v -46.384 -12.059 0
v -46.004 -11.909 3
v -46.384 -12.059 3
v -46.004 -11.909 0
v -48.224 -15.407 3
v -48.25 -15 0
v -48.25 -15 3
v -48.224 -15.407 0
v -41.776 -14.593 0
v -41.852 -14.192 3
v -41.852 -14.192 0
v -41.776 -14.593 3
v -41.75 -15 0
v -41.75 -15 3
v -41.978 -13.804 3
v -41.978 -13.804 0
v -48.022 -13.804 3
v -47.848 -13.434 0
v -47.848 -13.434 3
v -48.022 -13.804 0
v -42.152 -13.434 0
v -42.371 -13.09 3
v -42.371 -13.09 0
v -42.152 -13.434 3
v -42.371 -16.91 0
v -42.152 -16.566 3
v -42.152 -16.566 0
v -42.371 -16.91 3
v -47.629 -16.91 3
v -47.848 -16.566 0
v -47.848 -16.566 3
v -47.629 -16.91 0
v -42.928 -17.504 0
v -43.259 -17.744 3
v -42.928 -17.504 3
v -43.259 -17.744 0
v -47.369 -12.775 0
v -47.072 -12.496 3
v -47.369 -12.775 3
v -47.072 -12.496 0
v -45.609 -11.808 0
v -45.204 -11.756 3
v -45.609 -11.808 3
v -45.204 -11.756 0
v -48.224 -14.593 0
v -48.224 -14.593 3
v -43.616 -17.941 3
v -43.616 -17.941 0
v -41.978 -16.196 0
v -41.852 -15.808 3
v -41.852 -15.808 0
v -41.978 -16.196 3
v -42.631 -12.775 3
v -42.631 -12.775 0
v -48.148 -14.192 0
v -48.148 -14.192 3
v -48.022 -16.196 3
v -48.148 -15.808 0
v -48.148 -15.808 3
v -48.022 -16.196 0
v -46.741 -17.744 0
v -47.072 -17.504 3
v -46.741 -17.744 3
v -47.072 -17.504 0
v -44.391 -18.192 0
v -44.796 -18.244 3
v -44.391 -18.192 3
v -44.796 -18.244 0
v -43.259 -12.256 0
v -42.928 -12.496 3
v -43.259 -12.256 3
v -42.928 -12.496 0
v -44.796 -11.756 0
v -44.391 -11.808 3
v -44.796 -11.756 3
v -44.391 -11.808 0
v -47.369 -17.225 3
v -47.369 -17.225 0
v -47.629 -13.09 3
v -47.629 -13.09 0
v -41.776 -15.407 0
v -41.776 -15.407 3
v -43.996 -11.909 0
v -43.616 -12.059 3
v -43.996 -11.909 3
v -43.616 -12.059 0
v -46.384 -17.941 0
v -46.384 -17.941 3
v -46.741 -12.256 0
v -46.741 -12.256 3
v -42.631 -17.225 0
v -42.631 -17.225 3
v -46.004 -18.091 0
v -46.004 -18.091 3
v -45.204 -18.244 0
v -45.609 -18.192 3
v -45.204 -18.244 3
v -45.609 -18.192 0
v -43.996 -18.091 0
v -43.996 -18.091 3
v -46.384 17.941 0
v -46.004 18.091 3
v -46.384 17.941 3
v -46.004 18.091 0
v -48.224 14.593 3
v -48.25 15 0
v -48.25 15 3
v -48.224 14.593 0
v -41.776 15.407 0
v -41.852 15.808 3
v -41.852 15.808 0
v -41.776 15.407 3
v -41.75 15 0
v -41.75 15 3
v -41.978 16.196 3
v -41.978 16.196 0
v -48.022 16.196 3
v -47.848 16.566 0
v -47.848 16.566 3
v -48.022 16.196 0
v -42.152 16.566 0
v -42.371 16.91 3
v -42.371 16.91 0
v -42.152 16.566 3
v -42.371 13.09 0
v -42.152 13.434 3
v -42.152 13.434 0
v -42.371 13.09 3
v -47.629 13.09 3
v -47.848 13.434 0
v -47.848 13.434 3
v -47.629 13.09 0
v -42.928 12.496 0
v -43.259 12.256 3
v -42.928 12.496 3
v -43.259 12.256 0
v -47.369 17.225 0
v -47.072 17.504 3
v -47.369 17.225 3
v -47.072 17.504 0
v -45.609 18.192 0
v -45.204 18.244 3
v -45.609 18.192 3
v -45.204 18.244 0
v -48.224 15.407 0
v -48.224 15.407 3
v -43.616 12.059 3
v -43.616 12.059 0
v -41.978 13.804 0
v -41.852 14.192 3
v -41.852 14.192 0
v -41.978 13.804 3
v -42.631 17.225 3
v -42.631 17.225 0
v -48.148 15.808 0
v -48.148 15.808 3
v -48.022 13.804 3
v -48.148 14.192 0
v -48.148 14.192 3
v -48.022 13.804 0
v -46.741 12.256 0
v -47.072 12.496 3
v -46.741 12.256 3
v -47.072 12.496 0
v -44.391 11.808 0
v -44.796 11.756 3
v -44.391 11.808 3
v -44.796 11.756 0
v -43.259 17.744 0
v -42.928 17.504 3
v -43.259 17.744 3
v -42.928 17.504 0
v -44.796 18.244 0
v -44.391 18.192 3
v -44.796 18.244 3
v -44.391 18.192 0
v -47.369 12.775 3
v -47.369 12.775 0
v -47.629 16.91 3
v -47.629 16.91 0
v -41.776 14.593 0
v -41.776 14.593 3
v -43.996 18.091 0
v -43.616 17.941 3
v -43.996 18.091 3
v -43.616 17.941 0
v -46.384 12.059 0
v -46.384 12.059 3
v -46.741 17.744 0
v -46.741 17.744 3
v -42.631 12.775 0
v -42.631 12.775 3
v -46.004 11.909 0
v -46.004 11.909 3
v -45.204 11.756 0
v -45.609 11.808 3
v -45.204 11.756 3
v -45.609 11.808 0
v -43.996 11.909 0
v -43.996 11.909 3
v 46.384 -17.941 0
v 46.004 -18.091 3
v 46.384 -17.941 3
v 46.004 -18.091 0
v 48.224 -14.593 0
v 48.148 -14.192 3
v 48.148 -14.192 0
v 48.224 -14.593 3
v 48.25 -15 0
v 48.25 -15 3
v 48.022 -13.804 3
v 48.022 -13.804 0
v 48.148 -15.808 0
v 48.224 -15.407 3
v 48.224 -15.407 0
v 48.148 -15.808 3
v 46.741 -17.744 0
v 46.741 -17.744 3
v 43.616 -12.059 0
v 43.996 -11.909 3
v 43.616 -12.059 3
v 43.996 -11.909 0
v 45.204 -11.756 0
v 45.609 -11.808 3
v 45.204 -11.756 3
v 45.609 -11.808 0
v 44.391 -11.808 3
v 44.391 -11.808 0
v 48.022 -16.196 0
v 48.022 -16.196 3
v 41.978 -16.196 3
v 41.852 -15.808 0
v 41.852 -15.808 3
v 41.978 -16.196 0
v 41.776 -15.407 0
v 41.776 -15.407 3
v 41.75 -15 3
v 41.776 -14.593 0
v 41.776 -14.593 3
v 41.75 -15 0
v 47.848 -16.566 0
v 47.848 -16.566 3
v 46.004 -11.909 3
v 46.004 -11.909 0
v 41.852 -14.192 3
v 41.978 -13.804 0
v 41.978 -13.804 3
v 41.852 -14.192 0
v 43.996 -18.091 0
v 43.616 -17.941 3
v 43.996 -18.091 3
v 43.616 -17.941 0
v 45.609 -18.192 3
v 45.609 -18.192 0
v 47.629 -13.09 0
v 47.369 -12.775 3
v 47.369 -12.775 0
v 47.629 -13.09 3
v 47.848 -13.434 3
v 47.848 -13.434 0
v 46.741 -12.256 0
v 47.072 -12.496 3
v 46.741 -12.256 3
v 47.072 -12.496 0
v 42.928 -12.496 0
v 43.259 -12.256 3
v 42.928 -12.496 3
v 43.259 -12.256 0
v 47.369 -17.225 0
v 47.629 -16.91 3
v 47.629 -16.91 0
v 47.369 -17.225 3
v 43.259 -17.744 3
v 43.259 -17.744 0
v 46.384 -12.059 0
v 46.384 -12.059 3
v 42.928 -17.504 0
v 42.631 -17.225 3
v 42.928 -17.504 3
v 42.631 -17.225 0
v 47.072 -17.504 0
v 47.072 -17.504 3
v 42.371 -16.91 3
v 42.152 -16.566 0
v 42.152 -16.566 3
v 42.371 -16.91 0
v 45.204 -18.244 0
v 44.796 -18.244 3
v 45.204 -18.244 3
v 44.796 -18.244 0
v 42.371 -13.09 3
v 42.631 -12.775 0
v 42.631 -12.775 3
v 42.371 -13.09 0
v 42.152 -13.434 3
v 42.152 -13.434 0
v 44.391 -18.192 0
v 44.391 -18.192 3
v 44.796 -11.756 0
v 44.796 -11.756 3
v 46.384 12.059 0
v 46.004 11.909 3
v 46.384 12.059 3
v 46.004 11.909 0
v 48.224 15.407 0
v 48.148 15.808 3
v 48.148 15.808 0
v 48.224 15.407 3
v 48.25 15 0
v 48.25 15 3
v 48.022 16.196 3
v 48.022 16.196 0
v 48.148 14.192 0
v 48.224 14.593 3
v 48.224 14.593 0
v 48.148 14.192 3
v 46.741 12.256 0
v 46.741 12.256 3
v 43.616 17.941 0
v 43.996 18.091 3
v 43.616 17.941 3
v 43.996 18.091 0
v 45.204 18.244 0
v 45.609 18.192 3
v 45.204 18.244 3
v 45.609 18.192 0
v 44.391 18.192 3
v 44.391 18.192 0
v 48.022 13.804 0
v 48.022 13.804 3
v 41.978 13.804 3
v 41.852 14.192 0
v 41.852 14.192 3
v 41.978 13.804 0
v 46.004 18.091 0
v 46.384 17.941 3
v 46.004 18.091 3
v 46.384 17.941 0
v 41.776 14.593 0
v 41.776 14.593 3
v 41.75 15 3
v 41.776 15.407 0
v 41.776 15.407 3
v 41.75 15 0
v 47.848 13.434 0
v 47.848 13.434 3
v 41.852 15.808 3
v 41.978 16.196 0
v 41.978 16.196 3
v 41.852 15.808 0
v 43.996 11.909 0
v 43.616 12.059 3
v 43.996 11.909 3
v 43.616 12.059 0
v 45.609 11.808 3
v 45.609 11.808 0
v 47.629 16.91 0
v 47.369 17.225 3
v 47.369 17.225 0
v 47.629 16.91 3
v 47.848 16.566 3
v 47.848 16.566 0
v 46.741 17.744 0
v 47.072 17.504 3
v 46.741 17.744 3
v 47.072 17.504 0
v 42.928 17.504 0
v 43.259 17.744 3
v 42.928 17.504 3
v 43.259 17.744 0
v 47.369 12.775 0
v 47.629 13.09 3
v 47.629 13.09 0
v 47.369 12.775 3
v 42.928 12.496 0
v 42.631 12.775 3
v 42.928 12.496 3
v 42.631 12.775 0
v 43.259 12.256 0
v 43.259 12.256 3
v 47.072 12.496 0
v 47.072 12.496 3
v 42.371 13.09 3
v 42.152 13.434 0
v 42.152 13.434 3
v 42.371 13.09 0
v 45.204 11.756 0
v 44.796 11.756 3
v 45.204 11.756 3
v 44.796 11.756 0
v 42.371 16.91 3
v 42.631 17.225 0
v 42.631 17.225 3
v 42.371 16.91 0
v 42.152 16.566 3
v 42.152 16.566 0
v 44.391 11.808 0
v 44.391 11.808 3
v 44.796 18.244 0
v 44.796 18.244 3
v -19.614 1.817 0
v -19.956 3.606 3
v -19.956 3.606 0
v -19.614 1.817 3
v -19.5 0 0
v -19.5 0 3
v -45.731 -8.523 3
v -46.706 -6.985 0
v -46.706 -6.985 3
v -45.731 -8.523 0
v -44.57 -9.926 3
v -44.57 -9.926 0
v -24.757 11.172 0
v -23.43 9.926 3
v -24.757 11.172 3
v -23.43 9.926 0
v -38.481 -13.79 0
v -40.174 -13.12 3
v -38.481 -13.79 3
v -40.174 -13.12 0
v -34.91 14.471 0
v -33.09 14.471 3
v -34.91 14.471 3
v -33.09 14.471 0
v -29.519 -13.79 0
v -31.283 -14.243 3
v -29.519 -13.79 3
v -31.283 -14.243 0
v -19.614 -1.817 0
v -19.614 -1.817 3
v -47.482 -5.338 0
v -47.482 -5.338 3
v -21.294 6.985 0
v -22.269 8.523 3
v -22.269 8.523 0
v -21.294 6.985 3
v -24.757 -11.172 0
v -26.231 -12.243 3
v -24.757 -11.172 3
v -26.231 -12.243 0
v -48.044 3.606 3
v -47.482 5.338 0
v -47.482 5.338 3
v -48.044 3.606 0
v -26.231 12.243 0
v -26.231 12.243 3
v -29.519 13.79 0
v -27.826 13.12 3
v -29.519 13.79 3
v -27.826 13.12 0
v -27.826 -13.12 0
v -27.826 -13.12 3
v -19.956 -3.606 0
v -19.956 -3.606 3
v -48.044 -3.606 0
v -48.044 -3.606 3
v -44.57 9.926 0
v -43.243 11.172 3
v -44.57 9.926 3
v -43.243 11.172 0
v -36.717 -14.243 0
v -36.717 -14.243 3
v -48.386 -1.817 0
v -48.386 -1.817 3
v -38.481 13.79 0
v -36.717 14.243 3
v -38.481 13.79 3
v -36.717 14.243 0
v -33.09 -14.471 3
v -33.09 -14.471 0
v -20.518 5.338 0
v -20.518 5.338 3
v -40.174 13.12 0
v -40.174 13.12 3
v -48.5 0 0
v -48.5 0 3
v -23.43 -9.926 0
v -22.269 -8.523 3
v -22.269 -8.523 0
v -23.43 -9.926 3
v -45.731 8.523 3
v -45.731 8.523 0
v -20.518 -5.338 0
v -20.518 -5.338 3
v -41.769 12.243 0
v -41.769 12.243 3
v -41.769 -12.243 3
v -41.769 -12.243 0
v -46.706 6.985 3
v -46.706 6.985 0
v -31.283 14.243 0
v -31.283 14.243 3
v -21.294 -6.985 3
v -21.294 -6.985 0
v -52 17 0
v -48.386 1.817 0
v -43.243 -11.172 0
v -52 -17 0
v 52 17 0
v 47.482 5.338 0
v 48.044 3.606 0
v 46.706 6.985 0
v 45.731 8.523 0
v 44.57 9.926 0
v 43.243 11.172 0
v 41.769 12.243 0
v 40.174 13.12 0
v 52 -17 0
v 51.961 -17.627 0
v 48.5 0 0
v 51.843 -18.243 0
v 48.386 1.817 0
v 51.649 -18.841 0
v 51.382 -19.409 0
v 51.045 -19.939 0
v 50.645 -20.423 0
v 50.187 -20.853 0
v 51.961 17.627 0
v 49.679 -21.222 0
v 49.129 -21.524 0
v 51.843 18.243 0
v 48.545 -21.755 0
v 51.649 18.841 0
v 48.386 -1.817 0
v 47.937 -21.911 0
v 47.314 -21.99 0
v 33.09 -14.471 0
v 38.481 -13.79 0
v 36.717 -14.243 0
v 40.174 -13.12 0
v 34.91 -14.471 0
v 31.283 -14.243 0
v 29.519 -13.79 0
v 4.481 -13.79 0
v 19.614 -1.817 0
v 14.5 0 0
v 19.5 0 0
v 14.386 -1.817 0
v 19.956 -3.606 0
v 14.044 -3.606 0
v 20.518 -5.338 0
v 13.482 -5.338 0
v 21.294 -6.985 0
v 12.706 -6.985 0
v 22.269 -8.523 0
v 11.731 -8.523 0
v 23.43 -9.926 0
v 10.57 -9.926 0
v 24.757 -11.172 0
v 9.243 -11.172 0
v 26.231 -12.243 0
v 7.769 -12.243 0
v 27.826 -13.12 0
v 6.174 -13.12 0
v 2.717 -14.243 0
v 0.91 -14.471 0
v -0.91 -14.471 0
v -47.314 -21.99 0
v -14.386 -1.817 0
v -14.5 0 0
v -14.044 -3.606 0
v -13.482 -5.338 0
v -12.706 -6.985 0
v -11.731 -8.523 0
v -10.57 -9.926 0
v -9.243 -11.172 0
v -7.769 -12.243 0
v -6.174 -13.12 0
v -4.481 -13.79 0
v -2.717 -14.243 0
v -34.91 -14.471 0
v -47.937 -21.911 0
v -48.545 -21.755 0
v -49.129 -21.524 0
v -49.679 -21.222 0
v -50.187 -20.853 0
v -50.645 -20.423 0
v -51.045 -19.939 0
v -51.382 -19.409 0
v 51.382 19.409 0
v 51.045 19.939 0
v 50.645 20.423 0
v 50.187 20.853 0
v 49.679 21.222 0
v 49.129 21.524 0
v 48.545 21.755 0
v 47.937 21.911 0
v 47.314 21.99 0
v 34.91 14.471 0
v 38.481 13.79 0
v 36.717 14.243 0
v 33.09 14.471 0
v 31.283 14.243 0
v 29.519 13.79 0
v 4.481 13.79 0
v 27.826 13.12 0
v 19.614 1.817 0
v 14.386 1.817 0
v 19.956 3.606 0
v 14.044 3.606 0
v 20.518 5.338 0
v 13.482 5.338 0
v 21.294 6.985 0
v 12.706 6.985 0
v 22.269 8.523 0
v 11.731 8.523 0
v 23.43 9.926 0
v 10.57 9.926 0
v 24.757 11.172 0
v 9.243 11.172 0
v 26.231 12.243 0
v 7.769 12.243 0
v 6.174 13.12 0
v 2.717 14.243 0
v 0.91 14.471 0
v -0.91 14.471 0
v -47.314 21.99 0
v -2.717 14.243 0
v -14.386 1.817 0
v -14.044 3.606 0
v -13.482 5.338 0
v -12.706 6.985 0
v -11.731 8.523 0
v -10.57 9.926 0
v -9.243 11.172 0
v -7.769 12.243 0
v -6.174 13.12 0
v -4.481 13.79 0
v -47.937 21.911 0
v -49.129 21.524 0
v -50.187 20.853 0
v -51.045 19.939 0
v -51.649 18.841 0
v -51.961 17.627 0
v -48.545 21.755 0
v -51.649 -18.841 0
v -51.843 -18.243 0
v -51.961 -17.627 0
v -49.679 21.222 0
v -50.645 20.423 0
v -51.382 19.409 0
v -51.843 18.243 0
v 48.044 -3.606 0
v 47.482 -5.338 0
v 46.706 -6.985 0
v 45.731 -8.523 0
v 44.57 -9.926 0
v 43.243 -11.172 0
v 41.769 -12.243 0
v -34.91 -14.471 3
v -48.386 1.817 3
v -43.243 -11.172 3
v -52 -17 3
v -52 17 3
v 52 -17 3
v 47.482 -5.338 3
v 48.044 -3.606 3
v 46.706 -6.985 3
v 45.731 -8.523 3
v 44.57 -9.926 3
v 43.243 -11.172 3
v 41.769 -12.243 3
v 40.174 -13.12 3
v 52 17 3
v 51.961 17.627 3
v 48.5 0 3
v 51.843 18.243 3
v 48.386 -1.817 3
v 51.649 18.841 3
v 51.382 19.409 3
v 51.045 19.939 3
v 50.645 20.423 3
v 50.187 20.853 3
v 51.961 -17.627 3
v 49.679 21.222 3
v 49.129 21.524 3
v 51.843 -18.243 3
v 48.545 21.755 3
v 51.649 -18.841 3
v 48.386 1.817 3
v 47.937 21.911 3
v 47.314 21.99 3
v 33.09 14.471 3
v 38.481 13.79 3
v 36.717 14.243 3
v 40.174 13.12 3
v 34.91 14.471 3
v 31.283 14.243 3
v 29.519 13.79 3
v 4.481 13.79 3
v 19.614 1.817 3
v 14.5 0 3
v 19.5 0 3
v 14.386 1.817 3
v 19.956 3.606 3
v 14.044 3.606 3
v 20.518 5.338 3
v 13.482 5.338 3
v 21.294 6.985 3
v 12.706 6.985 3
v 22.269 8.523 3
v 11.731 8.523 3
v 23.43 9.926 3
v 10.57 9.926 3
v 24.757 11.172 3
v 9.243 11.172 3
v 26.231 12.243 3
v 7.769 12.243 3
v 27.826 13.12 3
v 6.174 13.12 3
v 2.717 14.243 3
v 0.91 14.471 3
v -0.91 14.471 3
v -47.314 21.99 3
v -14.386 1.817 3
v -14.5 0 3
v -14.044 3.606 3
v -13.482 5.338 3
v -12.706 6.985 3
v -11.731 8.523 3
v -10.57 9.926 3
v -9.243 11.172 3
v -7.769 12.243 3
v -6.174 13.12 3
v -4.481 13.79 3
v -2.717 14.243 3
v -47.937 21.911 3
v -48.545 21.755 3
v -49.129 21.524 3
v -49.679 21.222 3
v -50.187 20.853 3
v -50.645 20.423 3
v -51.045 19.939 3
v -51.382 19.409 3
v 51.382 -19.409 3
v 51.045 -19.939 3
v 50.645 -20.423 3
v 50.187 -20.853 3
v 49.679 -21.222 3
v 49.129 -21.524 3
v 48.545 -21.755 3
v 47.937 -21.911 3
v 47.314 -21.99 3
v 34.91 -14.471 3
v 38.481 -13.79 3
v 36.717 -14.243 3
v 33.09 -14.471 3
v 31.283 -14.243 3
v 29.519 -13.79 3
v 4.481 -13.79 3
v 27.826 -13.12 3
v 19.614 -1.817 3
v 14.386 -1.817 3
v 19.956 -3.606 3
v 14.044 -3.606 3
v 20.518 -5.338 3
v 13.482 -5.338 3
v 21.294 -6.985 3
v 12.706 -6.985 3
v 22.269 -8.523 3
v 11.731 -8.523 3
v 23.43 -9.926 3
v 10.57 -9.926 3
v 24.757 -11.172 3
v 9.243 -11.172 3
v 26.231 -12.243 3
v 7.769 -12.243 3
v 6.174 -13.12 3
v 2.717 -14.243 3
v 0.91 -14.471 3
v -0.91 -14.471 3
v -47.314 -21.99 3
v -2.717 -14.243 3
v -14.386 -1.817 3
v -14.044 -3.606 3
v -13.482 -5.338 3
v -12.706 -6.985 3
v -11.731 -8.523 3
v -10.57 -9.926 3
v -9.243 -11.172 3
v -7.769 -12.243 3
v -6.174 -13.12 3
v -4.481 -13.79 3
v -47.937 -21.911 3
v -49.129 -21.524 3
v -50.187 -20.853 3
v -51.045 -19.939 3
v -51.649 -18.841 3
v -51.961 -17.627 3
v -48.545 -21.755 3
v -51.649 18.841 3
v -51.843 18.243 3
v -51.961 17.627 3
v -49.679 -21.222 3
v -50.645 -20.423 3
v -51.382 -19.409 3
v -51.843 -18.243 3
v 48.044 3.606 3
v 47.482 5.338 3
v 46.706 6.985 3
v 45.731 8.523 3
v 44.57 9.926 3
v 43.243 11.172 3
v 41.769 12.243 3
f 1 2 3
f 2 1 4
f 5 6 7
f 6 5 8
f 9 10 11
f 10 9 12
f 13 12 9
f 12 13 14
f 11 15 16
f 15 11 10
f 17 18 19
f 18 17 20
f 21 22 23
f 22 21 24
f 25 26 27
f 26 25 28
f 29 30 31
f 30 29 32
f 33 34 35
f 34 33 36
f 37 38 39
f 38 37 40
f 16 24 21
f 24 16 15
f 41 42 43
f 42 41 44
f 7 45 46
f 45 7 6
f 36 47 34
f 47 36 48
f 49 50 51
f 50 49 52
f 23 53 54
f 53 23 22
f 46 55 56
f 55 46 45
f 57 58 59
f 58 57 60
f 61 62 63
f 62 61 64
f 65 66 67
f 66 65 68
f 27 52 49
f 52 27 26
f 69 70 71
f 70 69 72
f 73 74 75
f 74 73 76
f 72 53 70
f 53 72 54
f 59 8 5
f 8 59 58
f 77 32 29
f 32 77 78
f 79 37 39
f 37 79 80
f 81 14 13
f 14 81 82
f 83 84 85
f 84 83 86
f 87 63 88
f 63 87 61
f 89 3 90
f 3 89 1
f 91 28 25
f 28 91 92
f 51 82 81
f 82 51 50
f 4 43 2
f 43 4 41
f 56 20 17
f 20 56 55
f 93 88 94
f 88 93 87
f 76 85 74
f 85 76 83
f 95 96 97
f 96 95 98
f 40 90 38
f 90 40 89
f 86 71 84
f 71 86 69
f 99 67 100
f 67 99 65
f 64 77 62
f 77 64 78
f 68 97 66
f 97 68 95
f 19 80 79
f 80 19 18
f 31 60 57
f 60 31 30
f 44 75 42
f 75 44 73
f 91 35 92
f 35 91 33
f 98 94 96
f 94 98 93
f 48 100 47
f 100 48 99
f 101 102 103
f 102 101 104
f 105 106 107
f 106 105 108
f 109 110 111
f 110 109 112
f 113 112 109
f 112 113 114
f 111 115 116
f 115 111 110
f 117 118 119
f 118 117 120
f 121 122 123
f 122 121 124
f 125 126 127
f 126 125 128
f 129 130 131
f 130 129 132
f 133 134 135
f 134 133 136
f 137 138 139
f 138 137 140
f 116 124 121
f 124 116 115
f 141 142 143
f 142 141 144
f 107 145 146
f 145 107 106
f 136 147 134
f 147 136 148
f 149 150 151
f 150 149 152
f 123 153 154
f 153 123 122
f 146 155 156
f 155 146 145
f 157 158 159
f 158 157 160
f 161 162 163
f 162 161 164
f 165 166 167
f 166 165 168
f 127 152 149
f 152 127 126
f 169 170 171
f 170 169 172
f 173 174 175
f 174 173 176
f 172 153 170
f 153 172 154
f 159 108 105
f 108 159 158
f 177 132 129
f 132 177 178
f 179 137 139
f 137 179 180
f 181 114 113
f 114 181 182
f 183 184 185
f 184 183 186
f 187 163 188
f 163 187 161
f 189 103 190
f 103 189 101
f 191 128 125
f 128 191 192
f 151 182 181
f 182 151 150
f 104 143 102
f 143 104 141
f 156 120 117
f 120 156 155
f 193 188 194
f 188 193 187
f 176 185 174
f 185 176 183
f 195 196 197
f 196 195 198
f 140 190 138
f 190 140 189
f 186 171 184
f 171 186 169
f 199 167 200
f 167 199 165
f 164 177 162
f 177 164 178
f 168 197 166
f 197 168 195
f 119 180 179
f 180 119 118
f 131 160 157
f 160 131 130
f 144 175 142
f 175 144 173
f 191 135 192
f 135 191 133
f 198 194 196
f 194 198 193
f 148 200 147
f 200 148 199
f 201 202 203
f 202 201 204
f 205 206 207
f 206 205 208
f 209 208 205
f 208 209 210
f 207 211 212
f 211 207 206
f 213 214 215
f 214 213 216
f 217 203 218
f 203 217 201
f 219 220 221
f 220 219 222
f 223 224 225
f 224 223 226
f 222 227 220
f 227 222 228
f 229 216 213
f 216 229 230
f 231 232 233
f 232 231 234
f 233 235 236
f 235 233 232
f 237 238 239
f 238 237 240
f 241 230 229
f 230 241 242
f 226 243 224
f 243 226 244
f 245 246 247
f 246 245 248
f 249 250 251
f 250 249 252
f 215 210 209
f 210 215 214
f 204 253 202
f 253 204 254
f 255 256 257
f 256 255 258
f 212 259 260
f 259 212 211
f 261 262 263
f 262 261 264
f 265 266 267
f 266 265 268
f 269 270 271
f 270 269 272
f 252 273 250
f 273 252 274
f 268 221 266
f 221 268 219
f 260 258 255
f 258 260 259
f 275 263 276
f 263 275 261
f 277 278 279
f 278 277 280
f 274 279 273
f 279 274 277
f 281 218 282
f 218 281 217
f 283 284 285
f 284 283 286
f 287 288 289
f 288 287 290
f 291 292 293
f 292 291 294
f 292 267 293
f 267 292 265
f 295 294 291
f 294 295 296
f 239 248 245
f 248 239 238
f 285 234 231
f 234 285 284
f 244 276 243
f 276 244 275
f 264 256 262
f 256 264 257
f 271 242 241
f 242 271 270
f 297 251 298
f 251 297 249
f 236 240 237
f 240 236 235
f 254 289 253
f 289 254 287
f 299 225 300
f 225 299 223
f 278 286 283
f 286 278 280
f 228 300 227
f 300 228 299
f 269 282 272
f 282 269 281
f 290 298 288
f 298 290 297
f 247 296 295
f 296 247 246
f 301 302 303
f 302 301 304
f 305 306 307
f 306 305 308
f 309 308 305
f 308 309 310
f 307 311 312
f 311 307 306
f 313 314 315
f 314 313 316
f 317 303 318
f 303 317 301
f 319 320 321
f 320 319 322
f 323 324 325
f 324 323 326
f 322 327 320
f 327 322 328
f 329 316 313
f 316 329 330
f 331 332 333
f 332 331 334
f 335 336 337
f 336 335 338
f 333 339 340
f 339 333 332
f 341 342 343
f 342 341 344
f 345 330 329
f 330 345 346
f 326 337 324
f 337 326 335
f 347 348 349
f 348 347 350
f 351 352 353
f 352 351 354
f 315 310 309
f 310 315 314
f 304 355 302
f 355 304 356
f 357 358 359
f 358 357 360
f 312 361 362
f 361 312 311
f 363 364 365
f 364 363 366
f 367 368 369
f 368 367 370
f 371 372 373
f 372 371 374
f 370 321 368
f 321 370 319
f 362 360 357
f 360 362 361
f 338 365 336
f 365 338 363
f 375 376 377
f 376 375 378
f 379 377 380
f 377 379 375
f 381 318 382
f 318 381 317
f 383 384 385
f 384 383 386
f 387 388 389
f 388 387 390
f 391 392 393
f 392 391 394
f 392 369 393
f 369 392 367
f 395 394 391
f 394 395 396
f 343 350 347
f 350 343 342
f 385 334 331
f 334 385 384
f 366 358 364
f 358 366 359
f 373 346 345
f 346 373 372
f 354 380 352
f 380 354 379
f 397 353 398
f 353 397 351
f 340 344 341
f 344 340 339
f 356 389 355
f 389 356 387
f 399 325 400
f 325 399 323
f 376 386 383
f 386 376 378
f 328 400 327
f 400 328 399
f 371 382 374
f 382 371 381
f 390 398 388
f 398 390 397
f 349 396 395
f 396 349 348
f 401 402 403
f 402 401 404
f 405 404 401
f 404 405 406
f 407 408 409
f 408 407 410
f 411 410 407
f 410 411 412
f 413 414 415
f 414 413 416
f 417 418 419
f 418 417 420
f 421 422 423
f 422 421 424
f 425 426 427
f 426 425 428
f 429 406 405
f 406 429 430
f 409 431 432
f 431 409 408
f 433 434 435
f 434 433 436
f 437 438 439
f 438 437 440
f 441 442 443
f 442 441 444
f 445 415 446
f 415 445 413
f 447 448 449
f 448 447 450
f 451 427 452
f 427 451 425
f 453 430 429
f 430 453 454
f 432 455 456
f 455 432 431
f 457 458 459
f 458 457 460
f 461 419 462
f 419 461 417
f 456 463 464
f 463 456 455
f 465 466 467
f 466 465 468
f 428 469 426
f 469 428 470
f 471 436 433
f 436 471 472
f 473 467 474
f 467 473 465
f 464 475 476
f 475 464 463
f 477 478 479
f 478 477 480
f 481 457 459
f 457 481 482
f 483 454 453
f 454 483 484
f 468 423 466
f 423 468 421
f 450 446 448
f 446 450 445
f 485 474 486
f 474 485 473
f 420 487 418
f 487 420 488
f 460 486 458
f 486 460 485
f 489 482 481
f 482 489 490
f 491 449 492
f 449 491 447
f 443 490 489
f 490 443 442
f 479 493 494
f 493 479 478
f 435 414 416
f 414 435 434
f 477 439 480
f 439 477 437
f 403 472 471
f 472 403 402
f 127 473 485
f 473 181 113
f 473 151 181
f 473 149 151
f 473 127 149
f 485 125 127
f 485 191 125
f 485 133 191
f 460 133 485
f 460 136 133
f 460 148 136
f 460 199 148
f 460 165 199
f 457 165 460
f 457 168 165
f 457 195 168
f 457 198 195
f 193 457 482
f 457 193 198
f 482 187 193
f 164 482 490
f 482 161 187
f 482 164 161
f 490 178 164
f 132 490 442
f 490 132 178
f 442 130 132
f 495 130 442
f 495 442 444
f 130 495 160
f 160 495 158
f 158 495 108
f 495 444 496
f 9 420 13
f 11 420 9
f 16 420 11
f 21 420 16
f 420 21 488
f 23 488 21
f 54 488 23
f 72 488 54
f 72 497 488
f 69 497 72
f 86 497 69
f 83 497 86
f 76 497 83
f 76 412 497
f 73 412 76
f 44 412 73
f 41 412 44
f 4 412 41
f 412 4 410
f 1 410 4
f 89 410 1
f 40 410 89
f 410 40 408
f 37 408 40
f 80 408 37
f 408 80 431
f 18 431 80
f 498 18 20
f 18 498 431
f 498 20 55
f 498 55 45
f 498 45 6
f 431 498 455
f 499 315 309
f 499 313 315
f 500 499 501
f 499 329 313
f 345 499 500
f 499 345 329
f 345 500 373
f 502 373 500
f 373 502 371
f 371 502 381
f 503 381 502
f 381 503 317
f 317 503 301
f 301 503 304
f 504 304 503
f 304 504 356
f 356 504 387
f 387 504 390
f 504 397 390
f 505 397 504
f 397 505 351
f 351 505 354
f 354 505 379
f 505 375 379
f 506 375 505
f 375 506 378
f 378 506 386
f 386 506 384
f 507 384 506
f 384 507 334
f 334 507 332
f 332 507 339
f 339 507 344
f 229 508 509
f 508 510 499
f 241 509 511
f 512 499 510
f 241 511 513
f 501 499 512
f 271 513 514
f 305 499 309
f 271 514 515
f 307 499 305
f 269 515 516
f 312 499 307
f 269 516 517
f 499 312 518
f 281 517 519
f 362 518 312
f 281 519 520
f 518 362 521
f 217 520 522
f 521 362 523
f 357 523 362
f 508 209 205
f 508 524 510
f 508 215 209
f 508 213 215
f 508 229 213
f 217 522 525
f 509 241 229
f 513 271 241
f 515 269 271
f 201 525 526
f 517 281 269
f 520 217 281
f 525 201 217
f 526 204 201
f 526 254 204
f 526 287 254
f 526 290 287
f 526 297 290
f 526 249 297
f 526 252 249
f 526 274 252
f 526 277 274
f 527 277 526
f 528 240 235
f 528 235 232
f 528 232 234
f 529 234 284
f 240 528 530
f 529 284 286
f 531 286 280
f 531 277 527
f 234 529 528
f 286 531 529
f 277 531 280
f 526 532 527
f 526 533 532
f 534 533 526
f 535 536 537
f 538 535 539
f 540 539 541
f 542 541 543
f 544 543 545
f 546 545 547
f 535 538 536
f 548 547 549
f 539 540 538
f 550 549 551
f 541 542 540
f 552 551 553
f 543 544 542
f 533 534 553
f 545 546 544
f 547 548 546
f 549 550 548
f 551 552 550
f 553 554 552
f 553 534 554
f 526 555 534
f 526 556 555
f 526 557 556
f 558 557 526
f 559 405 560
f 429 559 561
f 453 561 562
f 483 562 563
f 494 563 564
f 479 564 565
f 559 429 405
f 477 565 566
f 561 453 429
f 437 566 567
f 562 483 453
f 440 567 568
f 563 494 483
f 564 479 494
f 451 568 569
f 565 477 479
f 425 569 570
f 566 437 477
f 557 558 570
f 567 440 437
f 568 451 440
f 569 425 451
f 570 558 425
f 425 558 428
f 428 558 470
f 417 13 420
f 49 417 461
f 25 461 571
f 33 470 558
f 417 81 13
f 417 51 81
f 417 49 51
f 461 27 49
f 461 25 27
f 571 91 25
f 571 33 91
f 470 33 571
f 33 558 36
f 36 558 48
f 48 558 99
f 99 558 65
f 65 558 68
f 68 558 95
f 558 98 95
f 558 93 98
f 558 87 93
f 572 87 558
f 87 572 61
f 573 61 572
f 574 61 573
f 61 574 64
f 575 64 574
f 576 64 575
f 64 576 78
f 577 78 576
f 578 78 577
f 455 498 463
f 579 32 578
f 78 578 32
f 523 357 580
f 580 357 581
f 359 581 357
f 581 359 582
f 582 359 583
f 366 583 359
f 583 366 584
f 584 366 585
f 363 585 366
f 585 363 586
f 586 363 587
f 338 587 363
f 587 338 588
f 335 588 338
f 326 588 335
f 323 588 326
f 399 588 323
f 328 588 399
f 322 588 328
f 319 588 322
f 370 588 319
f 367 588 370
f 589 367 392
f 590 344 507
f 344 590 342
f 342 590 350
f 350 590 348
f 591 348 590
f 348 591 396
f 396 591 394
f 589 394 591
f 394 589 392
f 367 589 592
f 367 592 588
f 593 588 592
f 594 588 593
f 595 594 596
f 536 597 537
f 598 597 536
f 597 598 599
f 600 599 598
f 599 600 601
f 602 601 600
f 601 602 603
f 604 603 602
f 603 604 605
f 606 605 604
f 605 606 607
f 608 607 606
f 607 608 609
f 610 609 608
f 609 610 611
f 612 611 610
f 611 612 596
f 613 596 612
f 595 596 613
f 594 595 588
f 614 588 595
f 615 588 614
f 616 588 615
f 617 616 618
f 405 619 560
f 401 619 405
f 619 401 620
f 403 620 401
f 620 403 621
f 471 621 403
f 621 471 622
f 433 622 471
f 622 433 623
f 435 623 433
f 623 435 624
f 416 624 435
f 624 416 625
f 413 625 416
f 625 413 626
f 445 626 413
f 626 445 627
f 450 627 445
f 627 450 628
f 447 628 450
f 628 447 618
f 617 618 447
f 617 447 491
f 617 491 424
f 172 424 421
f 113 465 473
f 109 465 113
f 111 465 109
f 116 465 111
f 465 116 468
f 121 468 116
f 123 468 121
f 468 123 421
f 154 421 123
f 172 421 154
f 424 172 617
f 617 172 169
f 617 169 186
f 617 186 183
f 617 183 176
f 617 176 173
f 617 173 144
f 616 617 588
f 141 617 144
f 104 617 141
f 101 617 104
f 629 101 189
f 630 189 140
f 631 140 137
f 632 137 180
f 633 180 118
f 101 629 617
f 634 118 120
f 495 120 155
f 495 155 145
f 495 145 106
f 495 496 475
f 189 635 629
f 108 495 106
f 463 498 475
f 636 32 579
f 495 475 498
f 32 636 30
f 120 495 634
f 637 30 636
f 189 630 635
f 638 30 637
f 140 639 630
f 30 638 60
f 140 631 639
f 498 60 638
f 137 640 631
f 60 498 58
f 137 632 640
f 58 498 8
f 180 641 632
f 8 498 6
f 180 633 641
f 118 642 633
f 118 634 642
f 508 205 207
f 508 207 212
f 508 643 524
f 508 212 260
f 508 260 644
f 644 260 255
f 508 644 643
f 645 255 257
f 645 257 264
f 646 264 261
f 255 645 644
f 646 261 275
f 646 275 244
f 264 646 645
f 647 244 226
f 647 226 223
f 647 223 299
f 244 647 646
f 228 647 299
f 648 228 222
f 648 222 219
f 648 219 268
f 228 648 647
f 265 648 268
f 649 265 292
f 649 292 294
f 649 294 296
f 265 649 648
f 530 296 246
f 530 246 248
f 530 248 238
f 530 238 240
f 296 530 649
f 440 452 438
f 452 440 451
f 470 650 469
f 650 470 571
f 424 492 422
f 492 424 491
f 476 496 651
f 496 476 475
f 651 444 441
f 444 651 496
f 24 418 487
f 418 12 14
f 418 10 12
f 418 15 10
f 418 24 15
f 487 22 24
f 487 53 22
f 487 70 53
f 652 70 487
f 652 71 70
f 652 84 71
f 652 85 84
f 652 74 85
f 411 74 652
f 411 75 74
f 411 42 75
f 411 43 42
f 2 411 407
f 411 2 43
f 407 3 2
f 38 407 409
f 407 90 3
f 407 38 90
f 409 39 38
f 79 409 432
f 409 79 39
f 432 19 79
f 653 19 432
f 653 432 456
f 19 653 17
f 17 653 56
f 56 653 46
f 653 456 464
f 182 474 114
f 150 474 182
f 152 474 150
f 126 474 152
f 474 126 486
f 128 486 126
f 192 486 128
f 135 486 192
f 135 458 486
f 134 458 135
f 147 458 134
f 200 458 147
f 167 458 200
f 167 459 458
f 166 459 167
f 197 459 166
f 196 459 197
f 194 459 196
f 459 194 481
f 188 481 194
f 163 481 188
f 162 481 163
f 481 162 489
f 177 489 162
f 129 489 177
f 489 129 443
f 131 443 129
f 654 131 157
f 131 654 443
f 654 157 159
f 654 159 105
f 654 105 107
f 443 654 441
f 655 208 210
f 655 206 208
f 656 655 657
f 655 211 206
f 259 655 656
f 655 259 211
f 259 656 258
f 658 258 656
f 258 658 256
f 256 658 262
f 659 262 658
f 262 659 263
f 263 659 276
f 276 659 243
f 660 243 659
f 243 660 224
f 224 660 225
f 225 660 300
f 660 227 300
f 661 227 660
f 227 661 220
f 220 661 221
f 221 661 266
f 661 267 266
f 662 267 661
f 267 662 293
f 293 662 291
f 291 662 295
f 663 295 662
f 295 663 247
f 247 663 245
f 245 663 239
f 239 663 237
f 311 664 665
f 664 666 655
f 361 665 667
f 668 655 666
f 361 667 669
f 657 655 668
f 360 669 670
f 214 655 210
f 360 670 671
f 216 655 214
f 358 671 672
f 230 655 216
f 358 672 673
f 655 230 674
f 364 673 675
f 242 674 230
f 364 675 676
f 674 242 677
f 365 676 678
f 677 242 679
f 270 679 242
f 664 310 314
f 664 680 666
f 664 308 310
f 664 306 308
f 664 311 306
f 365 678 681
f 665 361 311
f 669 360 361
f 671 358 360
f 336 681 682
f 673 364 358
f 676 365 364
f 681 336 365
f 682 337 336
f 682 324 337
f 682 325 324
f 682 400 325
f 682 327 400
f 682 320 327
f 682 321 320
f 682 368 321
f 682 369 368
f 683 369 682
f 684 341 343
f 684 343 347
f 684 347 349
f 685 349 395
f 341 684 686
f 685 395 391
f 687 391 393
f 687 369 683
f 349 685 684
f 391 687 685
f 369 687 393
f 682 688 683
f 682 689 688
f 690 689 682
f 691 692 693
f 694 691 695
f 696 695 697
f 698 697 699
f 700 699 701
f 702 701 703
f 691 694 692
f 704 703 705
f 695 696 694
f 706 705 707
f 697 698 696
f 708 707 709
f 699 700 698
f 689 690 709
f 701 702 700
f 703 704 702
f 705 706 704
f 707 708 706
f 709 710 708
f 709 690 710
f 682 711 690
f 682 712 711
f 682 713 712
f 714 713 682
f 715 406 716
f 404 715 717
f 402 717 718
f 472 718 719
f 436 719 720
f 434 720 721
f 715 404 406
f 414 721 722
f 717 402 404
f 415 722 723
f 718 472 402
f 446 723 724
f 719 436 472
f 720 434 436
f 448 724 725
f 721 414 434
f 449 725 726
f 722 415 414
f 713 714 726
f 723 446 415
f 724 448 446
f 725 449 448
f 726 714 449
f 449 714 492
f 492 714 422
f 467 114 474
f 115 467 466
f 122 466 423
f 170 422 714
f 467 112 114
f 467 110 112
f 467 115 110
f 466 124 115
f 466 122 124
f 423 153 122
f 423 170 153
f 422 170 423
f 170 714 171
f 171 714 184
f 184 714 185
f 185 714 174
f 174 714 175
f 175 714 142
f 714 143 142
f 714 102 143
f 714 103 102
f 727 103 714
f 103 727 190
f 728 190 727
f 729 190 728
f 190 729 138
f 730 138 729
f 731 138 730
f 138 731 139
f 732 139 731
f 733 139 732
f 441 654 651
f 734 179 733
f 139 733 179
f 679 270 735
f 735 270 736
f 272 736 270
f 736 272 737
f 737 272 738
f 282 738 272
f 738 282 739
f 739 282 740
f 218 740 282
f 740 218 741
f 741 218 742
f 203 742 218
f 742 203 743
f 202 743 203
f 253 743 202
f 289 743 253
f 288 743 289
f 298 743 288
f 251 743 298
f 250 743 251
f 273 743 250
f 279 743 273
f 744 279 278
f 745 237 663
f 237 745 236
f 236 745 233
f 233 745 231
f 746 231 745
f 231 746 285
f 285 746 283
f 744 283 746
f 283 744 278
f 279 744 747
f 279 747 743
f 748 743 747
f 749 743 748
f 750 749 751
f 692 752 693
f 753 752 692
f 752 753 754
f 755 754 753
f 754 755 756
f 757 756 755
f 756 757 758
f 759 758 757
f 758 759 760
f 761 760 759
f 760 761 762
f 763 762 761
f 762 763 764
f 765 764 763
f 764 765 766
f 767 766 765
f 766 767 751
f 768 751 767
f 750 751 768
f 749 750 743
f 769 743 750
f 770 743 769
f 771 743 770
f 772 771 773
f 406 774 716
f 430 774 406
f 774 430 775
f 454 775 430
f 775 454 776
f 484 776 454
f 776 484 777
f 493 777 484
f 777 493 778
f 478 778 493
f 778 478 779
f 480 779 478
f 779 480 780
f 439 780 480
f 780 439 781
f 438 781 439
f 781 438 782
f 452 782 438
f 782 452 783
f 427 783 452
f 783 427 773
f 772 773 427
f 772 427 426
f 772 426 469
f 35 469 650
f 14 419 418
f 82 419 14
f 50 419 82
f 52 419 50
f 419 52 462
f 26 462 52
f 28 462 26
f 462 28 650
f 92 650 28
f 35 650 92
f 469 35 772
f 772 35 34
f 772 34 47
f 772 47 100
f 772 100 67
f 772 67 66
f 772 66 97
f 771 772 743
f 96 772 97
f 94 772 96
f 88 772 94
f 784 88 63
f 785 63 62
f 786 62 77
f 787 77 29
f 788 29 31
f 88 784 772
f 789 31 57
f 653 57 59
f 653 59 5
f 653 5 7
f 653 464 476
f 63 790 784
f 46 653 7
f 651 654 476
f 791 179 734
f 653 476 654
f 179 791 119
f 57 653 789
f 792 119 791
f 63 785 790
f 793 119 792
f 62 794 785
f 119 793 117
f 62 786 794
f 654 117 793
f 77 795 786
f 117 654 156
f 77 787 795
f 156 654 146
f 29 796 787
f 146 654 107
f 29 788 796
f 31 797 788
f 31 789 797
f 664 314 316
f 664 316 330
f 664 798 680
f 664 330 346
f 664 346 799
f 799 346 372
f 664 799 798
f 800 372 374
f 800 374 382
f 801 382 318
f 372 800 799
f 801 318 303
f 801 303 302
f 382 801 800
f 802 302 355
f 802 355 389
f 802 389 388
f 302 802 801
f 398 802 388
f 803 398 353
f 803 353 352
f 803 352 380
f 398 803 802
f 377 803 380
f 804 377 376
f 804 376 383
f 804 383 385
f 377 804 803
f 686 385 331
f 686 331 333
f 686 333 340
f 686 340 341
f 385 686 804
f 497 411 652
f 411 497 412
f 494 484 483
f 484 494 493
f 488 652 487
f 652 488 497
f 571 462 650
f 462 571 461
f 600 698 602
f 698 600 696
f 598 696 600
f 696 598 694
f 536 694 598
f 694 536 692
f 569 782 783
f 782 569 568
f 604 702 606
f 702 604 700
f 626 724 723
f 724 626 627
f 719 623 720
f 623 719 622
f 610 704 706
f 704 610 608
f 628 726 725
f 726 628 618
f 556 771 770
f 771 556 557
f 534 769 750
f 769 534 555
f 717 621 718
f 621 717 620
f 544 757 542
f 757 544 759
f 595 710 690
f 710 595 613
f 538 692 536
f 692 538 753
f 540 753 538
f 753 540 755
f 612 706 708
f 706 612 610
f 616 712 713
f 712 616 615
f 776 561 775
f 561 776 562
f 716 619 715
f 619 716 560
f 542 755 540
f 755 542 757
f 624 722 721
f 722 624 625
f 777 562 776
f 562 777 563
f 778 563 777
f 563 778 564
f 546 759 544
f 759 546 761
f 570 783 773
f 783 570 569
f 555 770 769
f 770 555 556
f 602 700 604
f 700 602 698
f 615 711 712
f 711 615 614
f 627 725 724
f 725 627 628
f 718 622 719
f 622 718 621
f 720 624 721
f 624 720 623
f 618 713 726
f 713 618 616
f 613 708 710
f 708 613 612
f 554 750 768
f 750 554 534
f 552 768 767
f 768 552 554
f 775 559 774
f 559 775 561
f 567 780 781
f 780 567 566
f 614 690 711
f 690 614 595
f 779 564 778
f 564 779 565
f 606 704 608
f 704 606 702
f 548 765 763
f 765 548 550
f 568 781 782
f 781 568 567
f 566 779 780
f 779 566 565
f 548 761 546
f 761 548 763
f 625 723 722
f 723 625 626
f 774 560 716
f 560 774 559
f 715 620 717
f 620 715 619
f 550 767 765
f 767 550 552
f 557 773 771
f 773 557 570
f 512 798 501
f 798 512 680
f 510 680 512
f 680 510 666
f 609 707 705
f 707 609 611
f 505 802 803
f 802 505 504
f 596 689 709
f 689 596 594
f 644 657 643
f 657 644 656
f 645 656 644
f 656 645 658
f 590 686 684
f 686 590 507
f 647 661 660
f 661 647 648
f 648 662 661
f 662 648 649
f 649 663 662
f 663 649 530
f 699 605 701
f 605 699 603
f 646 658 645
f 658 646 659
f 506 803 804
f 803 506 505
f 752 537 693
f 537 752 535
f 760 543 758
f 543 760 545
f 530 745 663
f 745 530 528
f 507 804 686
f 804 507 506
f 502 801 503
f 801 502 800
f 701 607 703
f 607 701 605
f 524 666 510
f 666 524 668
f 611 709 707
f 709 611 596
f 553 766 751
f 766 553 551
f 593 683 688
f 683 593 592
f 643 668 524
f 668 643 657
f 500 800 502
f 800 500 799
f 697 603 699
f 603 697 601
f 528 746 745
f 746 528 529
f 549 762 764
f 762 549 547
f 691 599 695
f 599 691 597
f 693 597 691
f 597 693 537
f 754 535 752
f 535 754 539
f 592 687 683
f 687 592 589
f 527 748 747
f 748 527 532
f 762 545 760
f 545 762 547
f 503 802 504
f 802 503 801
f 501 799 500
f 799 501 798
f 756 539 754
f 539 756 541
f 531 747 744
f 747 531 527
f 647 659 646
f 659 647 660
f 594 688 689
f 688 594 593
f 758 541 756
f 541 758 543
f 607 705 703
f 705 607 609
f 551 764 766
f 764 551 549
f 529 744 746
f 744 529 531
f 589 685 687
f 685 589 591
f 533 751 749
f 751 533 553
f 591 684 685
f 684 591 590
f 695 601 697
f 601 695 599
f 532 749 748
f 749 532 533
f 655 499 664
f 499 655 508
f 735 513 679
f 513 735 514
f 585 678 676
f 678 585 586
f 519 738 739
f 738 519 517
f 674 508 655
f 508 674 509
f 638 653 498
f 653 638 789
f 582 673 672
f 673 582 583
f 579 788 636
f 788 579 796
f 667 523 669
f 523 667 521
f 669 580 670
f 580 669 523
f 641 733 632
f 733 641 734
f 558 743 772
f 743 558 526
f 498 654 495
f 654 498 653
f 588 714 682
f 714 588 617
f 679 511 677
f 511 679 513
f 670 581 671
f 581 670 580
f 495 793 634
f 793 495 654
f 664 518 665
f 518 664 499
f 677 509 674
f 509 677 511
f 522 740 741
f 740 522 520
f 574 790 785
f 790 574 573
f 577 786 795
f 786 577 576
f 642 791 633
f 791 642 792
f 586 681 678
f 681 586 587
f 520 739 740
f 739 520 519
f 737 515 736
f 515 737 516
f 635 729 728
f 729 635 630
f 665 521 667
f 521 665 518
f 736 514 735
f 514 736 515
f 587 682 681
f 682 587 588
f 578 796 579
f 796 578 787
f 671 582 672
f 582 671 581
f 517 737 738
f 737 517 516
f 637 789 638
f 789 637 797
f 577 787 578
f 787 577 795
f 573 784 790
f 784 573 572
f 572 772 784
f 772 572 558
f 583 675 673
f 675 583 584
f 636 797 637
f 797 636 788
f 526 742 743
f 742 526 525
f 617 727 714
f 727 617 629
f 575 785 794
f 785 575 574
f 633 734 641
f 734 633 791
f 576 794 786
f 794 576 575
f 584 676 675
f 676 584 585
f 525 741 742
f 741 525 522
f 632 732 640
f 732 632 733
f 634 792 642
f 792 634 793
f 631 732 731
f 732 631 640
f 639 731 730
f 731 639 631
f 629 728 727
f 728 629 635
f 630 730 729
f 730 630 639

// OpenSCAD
$fn = 50;

difference() {
	union() {
		hull() {
			translate(v = [-47.0, 17.0, 0]) {
				cylinder(h = 3, r = 5);
			}
			translate(v = [47.0, 17.0, 0]) {
				cylinder(h = 3, r = 5);
			}
			translate(v = [-47.0, -17.0, 0]) {
				cylinder(h = 3, r = 5);
			}
			translate(v = [47.0, -17.0, 0]) {
				cylinder(h = 3, r = 5);
			}
		}
	}
	union() {
		translate(v = [-45.0, -15.0, -100.0]) {
			cylinder(h = 200, r = 3.25);
		}
		translate(v = [-45.0, 15.0, -100.0]) {
			cylinder(h = 200, r = 3.25);
		}
		translate(v = [45.0, -15.0, -100.0]) {
			cylinder(h = 200, r = 3.25);
		}
		translate(v = [45.0, 15.0, -100.0]) {
			cylinder(h = 200, r = 3.25);
		}
		translate(v = [-45.0, -15.0, -100.0]) {
			cylinder(h = 200, r = 1.8);
		}
		translate(v = [-45.0, 15.0, -100.0]) {
			cylinder(h = 200, r = 1.8);
		}
		translate(v = [45.0, -15.0, -100.0]) {
			cylinder(h = 200, r = 1.8);
		}
		translate(v = [45.0, 15.0, -100.0]) {
			cylinder(h = 200, r = 1.8);
		}
		translate(v = [-34.0, 0, 0.0]) {
			cylinder(h = 3, r = 14.5);
		}
		cylinder(h = 3, r = 14.5);
		translate(v = [34.0, 0, 0.0]) {
			cylinder(h = 3, r = 14.5);
		}
	}
}
